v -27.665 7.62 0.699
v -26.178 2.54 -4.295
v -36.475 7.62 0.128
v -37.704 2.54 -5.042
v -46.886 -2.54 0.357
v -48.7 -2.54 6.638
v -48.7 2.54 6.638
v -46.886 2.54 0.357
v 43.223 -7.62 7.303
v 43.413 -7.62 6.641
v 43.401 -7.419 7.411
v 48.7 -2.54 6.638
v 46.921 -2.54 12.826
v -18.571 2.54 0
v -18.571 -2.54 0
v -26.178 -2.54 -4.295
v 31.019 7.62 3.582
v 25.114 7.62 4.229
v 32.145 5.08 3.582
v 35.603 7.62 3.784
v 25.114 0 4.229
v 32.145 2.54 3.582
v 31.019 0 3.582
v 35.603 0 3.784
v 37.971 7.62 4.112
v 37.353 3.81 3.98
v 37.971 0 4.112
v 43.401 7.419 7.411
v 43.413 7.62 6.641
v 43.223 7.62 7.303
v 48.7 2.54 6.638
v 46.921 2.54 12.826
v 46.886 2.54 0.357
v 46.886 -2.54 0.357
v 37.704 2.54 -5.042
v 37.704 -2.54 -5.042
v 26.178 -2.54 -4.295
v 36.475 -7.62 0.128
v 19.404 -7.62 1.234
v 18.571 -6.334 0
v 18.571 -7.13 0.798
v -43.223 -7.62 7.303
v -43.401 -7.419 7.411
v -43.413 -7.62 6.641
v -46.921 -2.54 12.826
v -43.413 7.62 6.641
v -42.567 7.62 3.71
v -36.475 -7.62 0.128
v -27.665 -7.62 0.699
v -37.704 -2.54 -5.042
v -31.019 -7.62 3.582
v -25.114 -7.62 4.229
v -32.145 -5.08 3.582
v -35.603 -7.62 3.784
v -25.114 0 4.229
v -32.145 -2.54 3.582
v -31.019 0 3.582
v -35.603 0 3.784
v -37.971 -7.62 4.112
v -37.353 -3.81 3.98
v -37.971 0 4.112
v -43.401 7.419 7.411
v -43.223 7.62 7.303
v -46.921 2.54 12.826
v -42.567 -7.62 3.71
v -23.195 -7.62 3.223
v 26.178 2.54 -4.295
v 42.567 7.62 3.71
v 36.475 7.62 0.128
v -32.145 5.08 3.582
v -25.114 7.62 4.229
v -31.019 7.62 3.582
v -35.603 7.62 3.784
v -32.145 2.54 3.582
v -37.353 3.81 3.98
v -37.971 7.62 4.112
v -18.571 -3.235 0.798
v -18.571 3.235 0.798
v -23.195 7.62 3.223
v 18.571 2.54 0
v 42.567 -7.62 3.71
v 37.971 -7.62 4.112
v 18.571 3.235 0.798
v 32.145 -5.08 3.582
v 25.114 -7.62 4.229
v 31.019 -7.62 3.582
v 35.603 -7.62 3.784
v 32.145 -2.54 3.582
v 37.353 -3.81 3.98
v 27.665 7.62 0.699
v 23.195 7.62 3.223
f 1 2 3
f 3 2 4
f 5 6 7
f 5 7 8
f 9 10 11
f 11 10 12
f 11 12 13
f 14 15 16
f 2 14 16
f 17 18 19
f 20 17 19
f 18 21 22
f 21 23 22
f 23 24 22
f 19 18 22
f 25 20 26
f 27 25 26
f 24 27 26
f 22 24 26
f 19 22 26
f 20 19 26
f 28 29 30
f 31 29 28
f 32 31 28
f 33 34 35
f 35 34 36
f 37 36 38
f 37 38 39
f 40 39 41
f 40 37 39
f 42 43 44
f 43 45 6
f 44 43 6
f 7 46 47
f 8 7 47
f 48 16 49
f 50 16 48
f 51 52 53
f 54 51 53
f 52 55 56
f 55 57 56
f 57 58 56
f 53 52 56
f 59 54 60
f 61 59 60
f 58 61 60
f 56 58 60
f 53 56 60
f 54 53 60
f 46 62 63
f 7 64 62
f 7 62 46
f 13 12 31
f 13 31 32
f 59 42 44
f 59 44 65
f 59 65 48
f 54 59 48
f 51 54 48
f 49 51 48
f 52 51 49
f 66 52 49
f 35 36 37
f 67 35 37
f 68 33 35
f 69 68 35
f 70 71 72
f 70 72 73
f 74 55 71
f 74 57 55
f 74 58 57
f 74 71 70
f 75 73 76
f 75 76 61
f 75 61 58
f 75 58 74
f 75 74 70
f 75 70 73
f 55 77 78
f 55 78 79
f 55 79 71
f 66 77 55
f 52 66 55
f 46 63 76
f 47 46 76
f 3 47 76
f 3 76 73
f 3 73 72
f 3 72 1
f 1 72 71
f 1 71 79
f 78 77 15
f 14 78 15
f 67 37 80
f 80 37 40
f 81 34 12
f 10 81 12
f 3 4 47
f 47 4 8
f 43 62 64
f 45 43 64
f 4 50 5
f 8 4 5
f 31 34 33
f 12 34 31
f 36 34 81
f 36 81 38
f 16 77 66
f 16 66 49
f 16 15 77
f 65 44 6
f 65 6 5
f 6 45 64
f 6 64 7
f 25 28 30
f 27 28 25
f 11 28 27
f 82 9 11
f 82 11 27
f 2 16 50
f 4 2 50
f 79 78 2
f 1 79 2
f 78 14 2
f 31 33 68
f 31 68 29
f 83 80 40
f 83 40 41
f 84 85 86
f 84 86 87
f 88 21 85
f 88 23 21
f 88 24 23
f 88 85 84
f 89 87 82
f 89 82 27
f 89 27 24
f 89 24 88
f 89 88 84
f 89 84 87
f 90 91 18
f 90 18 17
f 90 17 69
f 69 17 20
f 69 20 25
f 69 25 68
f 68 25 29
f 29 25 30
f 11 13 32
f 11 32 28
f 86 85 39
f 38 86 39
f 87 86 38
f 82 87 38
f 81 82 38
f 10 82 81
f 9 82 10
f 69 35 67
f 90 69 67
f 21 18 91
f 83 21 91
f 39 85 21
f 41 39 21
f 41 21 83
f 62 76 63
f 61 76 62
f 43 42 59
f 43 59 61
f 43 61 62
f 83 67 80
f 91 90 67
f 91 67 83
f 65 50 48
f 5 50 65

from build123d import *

# Parameters (mm, degrees)
F1_DEPTH = 7.62
F2_DEPTH = 7.62
F4_DEPTH = 25.4
F5_SIZE  = 5.08
F6_SIZE  = 5.08


with BuildPart() as f1:
    # F0 (on Front) → F1 (new body)
    with BuildSketch(Plane.XZ):
        with BuildLine():
            Line((8.2811145112, 1.2285960838), (0, 15.4874408618))
            Line((0, 15.4874408618), (-8.2811145112, 1.2285960838))
            Line((-8.2811145112, 1.2285960838), (-12.3727992177, 8.1617282704))
            Line((-12.3727992177, 8.1617282704), (-11.9023714215, 16.1495022476))
            add(Edge.make_bspline(
                [(-11.9023714215, 16.1495022476), (-13.1613517272, 16.6548575419), (-15.5670384726, 17.6205013473), (-17.5333922375, 20.1015797679), (-20.5609874273, 22.6867834573), (-21.4873396412, 24.6462285212), (-22.7265176962, 26.164892306), (-23.3956482261, 26.9849393517)],
                knots=[0, 0, 0, 0, 0.2204500858, 0.4212407827, 0.6411829959, 0.8062462362, 1, 1, 1, 1], degree=3))
            Line((-23.3956482261, 26.9849393517), (-23.3956482261, 30.6120049208))
            Line((-23.3956482261, 30.6120049208), (-28.4874904901, 20.2190671116))
            add(Edge.make_bspline(
                [(-28.4874904901, 20.2190671116), (-26.7351245713, 18.6815123537), (-23.471648253, 15.8180844094), (-18.698489342, 12.765512723), (-18.619259599, 5.307731901), (-18.5713469982, 0.7977882633)],
                knots=[0, 0, 0, 0, 0.3143060786, 0.5853403295, 1, 1, 1, 1], degree=3))
            Line((-18.5713469982, 0.7977882633), (-25.1141153276, 4.229309503))
            add(Edge.make_bspline(
                [(-25.1141153276, 4.229309503), (-27.2113543103, 3.8803000814), (-31.2175880029, 3.2136076751), (-38.0307467331, 4.0171950636), (-37.9710688228, 4.111548475), (-37.9713065922, 4.1118925437)],
                knots=[0, 0, 0, 0, 0.5026791859, 0.9602388224, 0.9760311652, 0.9760311652, 0.9760311652, 0.9760311652], degree=3))
            Line((-37.9713065922, 4.1118925437), (-43.4008166194, 7.4114357121))
            Line((-43.4008166194, 7.4114357121), (-46.9205416739, 12.8263989463))
            Line((-46.9205416739, 12.8263989463), (-48.6997440457, 6.6378694028))
            Line((-48.6997440457, 6.6378694028), (-46.8862317502, 0.3569243418))
            Line((-46.8862317502, 0.3569243418), (-50.1090995967, 2.34253495))
            Line((-50.1090995967, 2.34253495), (-54.2478188872, 9.5133557916))
            Line((-54.2478188872, 9.5133557916), (-56.9247491658, 21.5117353946))
            Line((-56.9247491658, 21.5117353946), (-60.4143179953, 10.0391805172))
            Line((-60.4143179953, 10.0391805172), (-59.0758509934, -0.716338749))
            Line((-59.0758509934, -0.716338749), (-61.4659674466, 1.1479511159))
            Line((-61.4659674466, 1.1479511159), (-65.5291676521, 8.0792857334))
            Line((-65.5291676521, 8.0792857334), (-66.8426156044, 23.612709716))
            Line((-66.8426156044, 23.612709716), (-70.5394372344, 10.0391805172))
            Line((-70.5394372344, 10.0391805172), (-70.5394372344, -4.383392632))
            Line((-70.5394372344, -4.383392632), (-64.0365630388, -13.9240529388))
            Line((-64.0365630388, -13.9240529388), (-58.2605600357, -17.2362215817))
            Line((-58.2605600357, -17.2362215817), (-57.4691556394, -21.3832873851))
            Line((-57.4691556394, -21.3832873851), (-50.0076673925, -19.3392392248))
            Line((-50.0076673925, -19.3392392248), (-43.4008166194, -18.7325309962))
            Line((-43.4008166194, -18.7325309962), (-31.6388532519, -30.0529096276))
            Line((-31.6388532519, -30.0529096276), (-30.9283062816, -21.5263534337))
            Line((-30.9283062816, -21.5263534337), (-24.7964542359, -15.9849915653))
            Line((-24.7964542359, -15.9849915653), (-12.4508133158, -11.1685302109))
            Line((-12.4508133158, -11.1685302109), (-2.8095340822, -10.3738503531))
            Line((-2.8095340822, -10.3738503531), (0, -15.2332289144))
            Line((0, -15.2332289144), (2.8095340822, -10.3738503531))
            Line((2.8095340822, -10.3738503531), (12.4508133158, -11.1685302109))
            Line((12.4508133158, -11.1685302109), (24.7964542359, -15.9849915653))
            Line((24.7964542359, -15.9849915653), (30.9283062816, -21.5263534337))
            Line((30.9283062816, -21.5263534337), (31.6388532519, -30.0529096276))
            Line((31.6388532519, -30.0529096276), (43.4008166194, -18.7325309962))
            Line((43.4008166194, -18.7325309962), (50.0076673925, -19.3392392248))
            Line((50.0076673925, -19.3392392248), (57.4691556394, -21.3832873851))
            Line((57.4691556394, -21.3832873851), (58.2605600357, -17.2362215817))
            Line((58.2605600357, -17.2362215817), (64.0365630388, -13.9240529388))
            Line((64.0365630388, -13.9240529388), (70.5394372344, -4.383392632))
            Line((70.5394372344, -4.383392632), (70.5394372344, 10.0391805172))
            Line((70.5394372344, 10.0391805172), (66.8426156044, 23.612709716))
            Line((66.8426156044, 23.612709716), (65.5291676521, 8.0792857334))
            Line((65.5291676521, 8.0792857334), (61.4659674466, 1.1479511159))
            Line((61.4659674466, 1.1479511159), (59.0758509934, -0.716338749))
            Line((59.0758509934, -0.716338749), (60.4143179953, 10.0391805172))
            Line((60.4143179953, 10.0391805172), (56.9247491658, 21.5117353946))
            Line((56.9247491658, 21.5117353946), (54.2478188872, 9.5133557916))
            Line((54.2478188872, 9.5133557916), (50.1090995967, 2.34253495))
            Line((50.1090995967, 2.34253495), (46.8862317502, 0.3569243418))
            Line((46.8862317502, 0.3569243418), (48.6997440457, 6.6378694028))
            Line((48.6997440457, 6.6378694028), (46.9205416739, 12.8263989463))
            Line((46.9205416739, 12.8263989463), (43.4008166194, 7.4114357121))
            Line((43.4008166194, 7.4114357121), (37.9713065922, 4.1118925437))
            add(Edge.make_bspline(
                [(25.1141153276, 4.229309503), (27.2113543103, 3.8803000814), (31.2175880029, 3.2136076751), (38.0307467331, 4.0171950636), (37.9710688228, 4.111548475), (37.9713065922, 4.1118925437)],
                knots=[0, 0, 0, 0, 0.5026791859, 0.9602388224, 0.9760311652, 0.9760311652, 0.9760311652, 0.9760311652], degree=3))
            Line((25.1141153276, 4.229309503), (18.5713469982, 0.7977882633))
            add(Edge.make_bspline(
                [(28.4874904901, 20.2190671116), (26.7351245713, 18.6815123537), (23.471648253, 15.8180844094), (18.698489342, 12.765512723), (18.619259599, 5.307731901), (18.5713469982, 0.7977882633)],
                knots=[0, 0, 0, 0, 0.3143060786, 0.5853403295, 1, 1, 1, 1], degree=3))
            Line((28.4874904901, 20.2190671116), (23.3956482261, 30.6120049208))
            Line((23.3956482261, 30.6120049208), (23.3956482261, 26.9849393517))
            add(Edge.make_bspline(
                [(11.9023714215, 16.1495022476), (13.1613517272, 16.6548575419), (15.5670384726, 17.6205013473), (17.5333922375, 20.1015797679), (20.5609874273, 22.6867834573), (21.4873396412, 24.6462285212), (22.7265176962, 26.164892306), (23.3956482261, 26.9849393517)],
                knots=[0, 0, 0, 0, 0.2204500858, 0.4212407827, 0.6411829959, 0.8062462362, 1, 1, 1, 1], degree=3))
            Line((11.9023714215, 16.1495022476), (12.3727992177, 8.1617282704))
            Line((12.3727992177, 8.1617282704), (8.2811145112, 1.2285960838))
        make_face()
    extrude(amount=F1_DEPTH)

    # F2 (add): a face of the model
    f2_faces = [f1.faces().sort_by_distance(p)[0] for p in [
        (0, 0, -2.9396699917),
    ]]
    extrude(f2_faces, amount=F2_DEPTH)

    # F3 (on face) → F4 (cut)
    with BuildSketch(Plane.XZ.offset(7.62)):
        with BuildLine():
            Line((50.1090995967, 2.34253495), (46.8862317502, 0.3569243418))
            Line((46.8862317502, 0.3569243418), (37.704244256, -5.042350851))
            Line((37.704244256, -5.042350851), (26.178041473, -4.2952820659))
            Line((26.178041473, -4.2952820659), (18.5713469982, 0))
            Line((18.5713469982, 0), (18.5713469982, 0.7977882633))
            add(Edge.make_bspline(
                [(28.4874904901, 20.2190671116), (26.7351245713, 18.6815123537), (23.471648253, 15.8180844094), (18.698489342, 12.765512723), (18.619259599, 5.307731901), (18.5713469982, 0.7977882633)],
                knots=[0, 0, 0, 0, 0.3143060786, 0.5853403295, 1, 1, 1, 1], degree=3))
            Line((28.4874904901, 20.2190671116), (23.3956482261, 30.6120049208))
            Line((23.3956482261, 30.6120049208), (23.3956482261, 26.9849393517))
            add(Edge.make_bspline(
                [(11.9023714215, 16.1495022476), (13.1613517272, 16.6548575419), (15.5670384726, 17.6205013473), (17.5333922375, 20.1015797679), (20.5609874273, 22.6867834573), (21.4873396412, 24.6462285212), (22.7265176962, 26.164892306), (23.3956482261, 26.9849393517)],
                knots=[0, 0, 0, 0, 0.2204500858, 0.4212407827, 0.6411829959, 0.8062462362, 1, 1, 1, 1], degree=3))
            Line((11.9023714215, 16.1495022476), (12.3727992177, 8.1617282704))
            Line((12.3727992177, 8.1617282704), (11.8300747126, 1.1479511159))
            Line((11.8300747126, 1.1479511159), (14.1611397266, -7.0250043646))
            Line((14.1611397266, -7.0250043646), (21.2970543653, -9.0706339106))
            Line((21.2970543653, -9.0706339106), (24.7849505395, -10.6449779123))
            Line((24.7849505395, -10.6449779123), (37.9713065922, -13.2080012186))
            Line((37.9713065922, -13.2080012186), (38.8208404183, -12.7084506676))
            Line((38.8208404183, -12.7084506676), (50.1090995967, -9.5750857145))
            Line((50.1090995967, -9.5750857145), (54.7299973552, -7.0923368166))
            Line((54.7299973552, -7.0923368166), (59.0758509934, -0.716338749))
            Line((59.0758509934, -0.716338749), (60.4143179953, 10.0391805172))
            Line((60.4143179953, 10.0391805172), (56.9247491658, 21.5117353946))
            Line((56.9247491658, 21.5117353946), (54.2478188872, 9.5133557916))
            Line((54.2478188872, 9.5133557916), (50.1090995967, 2.34253495))
        make_face()
        Polygon((61.4659674466, 1.1479511159), (59.0758509934, -0.716338749), (54.7299973552, -7.0923368166), (50.1090995967, -9.5750857145), (38.8208404183, -12.7084506676), (37.9713065922, -13.2080012186), (24.7849505395, -10.6449779123), (21.2970543653, -9.0706339106), (14.1611397266, -7.0250043646), (11.8300747126, 1.1479511159), (12.3727992177, 8.1617282704), (8.2811145112, 1.2285960838), (9.0035646737, 0), (2.8095340822, -10.3738503531), (12.4508133158, -11.1685302109), (24.7964542359, -15.9849915653), (30.9283062816, -21.5263534337), (31.6388532519, -30.0529096276), (43.4008166194, -18.7325309962), (50.0076673925, -19.3392392248), (57.4691556394, -21.3832873851), (58.2605600357, -17.2362215817), (64.0365630388, -13.9240529388), (70.5394372344, -4.383392632), (70.5394372344, 10.0391805172), (66.8426156044, 23.612709716), (65.5291676521, 8.0792857334), align=None)
        Polygon((9.0035646737, 0), (8.2811145112, 1.2285960838), (0, 15.4874408618), (-8.2811145112, 1.2285960838), (-9.0035646737, 0), (-2.8095340822, -10.3738503531), (0, -15.2332289144), (2.8095340822, -10.3738503531), align=None)
        Polygon((-9.0035646737, 0), (-8.2811145112, 1.2285960838), (-12.3727992177, 8.1617282704), (-11.8300747126, 1.1479511159), (-14.1611397266, -7.0250043646), (-21.2970543653, -9.0706339106), (-24.7849505395, -10.6449779123), (-37.9713065922, -13.2080012186), (-38.8208404183, -12.7084506676), (-50.1090995967, -9.5750857145), (-54.7299973552, -7.0923368166), (-59.0758509934, -0.716338749), (-61.4659674466, 1.1479511159), (-65.5291676521, 8.0792857334), (-66.8426156044, 23.612709716), (-70.5394372344, 10.0391805172), (-70.5394372344, -4.383392632), (-64.0365630388, -13.9240529388), (-58.2605600357, -17.2362215817), (-57.4691556394, -21.3832873851), (-50.0076673925, -19.3392392248), (-43.4008166194, -18.7325309962), (-31.6388532519, -30.0529096276), (-30.9283062816, -21.5263534337), (-24.7964542359, -15.9849915653), (-12.4508133158, -11.1685302109), (-2.8095340822, -10.3738503531), align=None)
        with BuildLine():
            Line((-11.8300747126, 1.1479511159), (-12.3727992177, 8.1617282704))
            Line((-12.3727992177, 8.1617282704), (-11.9023714215, 16.1495022476))
            add(Edge.make_bspline(
                [(-11.9023714215, 16.1495022476), (-13.1613517272, 16.6548575419), (-15.5670384726, 17.6205013473), (-17.5333922375, 20.1015797679), (-20.5609874273, 22.6867834573), (-21.4873396412, 24.6462285212), (-22.7265176962, 26.164892306), (-23.3956482261, 26.9849393517)],
                knots=[0, 0, 0, 0, 0.2204500858, 0.4212407827, 0.6411829959, 0.8062462362, 1, 1, 1, 1], degree=3))
            Line((-23.3956482261, 26.9849393517), (-23.3956482261, 30.6120049208))
            Line((-23.3956482261, 30.6120049208), (-28.4874904901, 20.2190671116))
            add(Edge.make_bspline(
                [(-28.4874904901, 20.2190671116), (-26.7351245713, 18.6815123537), (-23.471648253, 15.8180844094), (-18.698489342, 12.765512723), (-18.619259599, 5.307731901), (-18.5713469982, 0.7977882633)],
                knots=[0, 0, 0, 0, 0.3143060786, 0.5853403295, 1, 1, 1, 1], degree=3))
            Line((-18.5713469982, 0.7977882633), (-18.5713469982, 0))
            Line((-18.5713469982, 0), (-26.178041473, -4.2952820659))
            Line((-26.178041473, -4.2952820659), (-37.704244256, -5.042350851))
            Line((-37.704244256, -5.042350851), (-46.8862317502, 0.3569243418))
            Line((-46.8862317502, 0.3569243418), (-50.1090995967, 2.34253495))
            Line((-50.1090995967, 2.34253495), (-54.2478188872, 9.5133557916))
            Line((-54.2478188872, 9.5133557916), (-56.9247491658, 21.5117353946))
            Line((-56.9247491658, 21.5117353946), (-60.4143179953, 10.0391805172))
            Line((-60.4143179953, 10.0391805172), (-59.0758509934, -0.716338749))
            Line((-59.0758509934, -0.716338749), (-54.7299973552, -7.0923368166))
            Line((-54.7299973552, -7.0923368166), (-50.1090995967, -9.5750857145))
            Line((-50.1090995967, -9.5750857145), (-38.8208404183, -12.7084506676))
            Line((-38.8208404183, -12.7084506676), (-37.9713065922, -13.2080012186))
            Line((-37.9713065922, -13.2080012186), (-24.7849505395, -10.6449779123))
            Line((-24.7849505395, -10.6449779123), (-21.2970543653, -9.0706339106))
            Line((-21.2970543653, -9.0706339106), (-14.1611397266, -7.0250043646))
            Line((-14.1611397266, -7.0250043646), (-11.8300747126, 1.1479511159))
        make_face()
    extrude(amount=-F4_DEPTH, mode=Mode.SUBTRACT)

    # F5
    f5_edges = [f1.edges().sort_by_distance(p)[0] for p in [
        (31.941143, -7.62, -4.668816),
        (42.295238, -7.62, -2.342713),
        (47.792988, -7.62, 3.497397),
        (47.810143, -7.62, 9.732134),
        (-22.374694, -7.62, -2.147641),
        (-31.941143, -7.62, -4.668816),
        (-42.295238, -7.62, -2.342713),
        (-47.792988, -7.62, 3.497397),
        (-47.810143, -7.62, 9.732134),
    ]]
    chamfer(f5_edges, length=F5_SIZE)

    # F6
    f6_edges = [f1.edges().sort_by_distance(p)[0] for p in [
        (-47.810143, 7.62, 9.732134),
        (-47.792988, 7.62, 3.497397),
        (-42.295238, 7.62, -2.342713),
        (-31.941143, 7.62, -4.668816),
        (-22.374694, 7.62, -2.147641),
        (22.374694, 7.62, -2.147641),
        (31.941143, 7.62, -4.668816),
        (42.295238, 7.62, -2.342713),
        (47.792988, 7.62, 3.497397),
        (47.810143, 7.62, 9.732134),
    ]]
    chamfer(f6_edges, length=F6_SIZE)


solid = f1.part
